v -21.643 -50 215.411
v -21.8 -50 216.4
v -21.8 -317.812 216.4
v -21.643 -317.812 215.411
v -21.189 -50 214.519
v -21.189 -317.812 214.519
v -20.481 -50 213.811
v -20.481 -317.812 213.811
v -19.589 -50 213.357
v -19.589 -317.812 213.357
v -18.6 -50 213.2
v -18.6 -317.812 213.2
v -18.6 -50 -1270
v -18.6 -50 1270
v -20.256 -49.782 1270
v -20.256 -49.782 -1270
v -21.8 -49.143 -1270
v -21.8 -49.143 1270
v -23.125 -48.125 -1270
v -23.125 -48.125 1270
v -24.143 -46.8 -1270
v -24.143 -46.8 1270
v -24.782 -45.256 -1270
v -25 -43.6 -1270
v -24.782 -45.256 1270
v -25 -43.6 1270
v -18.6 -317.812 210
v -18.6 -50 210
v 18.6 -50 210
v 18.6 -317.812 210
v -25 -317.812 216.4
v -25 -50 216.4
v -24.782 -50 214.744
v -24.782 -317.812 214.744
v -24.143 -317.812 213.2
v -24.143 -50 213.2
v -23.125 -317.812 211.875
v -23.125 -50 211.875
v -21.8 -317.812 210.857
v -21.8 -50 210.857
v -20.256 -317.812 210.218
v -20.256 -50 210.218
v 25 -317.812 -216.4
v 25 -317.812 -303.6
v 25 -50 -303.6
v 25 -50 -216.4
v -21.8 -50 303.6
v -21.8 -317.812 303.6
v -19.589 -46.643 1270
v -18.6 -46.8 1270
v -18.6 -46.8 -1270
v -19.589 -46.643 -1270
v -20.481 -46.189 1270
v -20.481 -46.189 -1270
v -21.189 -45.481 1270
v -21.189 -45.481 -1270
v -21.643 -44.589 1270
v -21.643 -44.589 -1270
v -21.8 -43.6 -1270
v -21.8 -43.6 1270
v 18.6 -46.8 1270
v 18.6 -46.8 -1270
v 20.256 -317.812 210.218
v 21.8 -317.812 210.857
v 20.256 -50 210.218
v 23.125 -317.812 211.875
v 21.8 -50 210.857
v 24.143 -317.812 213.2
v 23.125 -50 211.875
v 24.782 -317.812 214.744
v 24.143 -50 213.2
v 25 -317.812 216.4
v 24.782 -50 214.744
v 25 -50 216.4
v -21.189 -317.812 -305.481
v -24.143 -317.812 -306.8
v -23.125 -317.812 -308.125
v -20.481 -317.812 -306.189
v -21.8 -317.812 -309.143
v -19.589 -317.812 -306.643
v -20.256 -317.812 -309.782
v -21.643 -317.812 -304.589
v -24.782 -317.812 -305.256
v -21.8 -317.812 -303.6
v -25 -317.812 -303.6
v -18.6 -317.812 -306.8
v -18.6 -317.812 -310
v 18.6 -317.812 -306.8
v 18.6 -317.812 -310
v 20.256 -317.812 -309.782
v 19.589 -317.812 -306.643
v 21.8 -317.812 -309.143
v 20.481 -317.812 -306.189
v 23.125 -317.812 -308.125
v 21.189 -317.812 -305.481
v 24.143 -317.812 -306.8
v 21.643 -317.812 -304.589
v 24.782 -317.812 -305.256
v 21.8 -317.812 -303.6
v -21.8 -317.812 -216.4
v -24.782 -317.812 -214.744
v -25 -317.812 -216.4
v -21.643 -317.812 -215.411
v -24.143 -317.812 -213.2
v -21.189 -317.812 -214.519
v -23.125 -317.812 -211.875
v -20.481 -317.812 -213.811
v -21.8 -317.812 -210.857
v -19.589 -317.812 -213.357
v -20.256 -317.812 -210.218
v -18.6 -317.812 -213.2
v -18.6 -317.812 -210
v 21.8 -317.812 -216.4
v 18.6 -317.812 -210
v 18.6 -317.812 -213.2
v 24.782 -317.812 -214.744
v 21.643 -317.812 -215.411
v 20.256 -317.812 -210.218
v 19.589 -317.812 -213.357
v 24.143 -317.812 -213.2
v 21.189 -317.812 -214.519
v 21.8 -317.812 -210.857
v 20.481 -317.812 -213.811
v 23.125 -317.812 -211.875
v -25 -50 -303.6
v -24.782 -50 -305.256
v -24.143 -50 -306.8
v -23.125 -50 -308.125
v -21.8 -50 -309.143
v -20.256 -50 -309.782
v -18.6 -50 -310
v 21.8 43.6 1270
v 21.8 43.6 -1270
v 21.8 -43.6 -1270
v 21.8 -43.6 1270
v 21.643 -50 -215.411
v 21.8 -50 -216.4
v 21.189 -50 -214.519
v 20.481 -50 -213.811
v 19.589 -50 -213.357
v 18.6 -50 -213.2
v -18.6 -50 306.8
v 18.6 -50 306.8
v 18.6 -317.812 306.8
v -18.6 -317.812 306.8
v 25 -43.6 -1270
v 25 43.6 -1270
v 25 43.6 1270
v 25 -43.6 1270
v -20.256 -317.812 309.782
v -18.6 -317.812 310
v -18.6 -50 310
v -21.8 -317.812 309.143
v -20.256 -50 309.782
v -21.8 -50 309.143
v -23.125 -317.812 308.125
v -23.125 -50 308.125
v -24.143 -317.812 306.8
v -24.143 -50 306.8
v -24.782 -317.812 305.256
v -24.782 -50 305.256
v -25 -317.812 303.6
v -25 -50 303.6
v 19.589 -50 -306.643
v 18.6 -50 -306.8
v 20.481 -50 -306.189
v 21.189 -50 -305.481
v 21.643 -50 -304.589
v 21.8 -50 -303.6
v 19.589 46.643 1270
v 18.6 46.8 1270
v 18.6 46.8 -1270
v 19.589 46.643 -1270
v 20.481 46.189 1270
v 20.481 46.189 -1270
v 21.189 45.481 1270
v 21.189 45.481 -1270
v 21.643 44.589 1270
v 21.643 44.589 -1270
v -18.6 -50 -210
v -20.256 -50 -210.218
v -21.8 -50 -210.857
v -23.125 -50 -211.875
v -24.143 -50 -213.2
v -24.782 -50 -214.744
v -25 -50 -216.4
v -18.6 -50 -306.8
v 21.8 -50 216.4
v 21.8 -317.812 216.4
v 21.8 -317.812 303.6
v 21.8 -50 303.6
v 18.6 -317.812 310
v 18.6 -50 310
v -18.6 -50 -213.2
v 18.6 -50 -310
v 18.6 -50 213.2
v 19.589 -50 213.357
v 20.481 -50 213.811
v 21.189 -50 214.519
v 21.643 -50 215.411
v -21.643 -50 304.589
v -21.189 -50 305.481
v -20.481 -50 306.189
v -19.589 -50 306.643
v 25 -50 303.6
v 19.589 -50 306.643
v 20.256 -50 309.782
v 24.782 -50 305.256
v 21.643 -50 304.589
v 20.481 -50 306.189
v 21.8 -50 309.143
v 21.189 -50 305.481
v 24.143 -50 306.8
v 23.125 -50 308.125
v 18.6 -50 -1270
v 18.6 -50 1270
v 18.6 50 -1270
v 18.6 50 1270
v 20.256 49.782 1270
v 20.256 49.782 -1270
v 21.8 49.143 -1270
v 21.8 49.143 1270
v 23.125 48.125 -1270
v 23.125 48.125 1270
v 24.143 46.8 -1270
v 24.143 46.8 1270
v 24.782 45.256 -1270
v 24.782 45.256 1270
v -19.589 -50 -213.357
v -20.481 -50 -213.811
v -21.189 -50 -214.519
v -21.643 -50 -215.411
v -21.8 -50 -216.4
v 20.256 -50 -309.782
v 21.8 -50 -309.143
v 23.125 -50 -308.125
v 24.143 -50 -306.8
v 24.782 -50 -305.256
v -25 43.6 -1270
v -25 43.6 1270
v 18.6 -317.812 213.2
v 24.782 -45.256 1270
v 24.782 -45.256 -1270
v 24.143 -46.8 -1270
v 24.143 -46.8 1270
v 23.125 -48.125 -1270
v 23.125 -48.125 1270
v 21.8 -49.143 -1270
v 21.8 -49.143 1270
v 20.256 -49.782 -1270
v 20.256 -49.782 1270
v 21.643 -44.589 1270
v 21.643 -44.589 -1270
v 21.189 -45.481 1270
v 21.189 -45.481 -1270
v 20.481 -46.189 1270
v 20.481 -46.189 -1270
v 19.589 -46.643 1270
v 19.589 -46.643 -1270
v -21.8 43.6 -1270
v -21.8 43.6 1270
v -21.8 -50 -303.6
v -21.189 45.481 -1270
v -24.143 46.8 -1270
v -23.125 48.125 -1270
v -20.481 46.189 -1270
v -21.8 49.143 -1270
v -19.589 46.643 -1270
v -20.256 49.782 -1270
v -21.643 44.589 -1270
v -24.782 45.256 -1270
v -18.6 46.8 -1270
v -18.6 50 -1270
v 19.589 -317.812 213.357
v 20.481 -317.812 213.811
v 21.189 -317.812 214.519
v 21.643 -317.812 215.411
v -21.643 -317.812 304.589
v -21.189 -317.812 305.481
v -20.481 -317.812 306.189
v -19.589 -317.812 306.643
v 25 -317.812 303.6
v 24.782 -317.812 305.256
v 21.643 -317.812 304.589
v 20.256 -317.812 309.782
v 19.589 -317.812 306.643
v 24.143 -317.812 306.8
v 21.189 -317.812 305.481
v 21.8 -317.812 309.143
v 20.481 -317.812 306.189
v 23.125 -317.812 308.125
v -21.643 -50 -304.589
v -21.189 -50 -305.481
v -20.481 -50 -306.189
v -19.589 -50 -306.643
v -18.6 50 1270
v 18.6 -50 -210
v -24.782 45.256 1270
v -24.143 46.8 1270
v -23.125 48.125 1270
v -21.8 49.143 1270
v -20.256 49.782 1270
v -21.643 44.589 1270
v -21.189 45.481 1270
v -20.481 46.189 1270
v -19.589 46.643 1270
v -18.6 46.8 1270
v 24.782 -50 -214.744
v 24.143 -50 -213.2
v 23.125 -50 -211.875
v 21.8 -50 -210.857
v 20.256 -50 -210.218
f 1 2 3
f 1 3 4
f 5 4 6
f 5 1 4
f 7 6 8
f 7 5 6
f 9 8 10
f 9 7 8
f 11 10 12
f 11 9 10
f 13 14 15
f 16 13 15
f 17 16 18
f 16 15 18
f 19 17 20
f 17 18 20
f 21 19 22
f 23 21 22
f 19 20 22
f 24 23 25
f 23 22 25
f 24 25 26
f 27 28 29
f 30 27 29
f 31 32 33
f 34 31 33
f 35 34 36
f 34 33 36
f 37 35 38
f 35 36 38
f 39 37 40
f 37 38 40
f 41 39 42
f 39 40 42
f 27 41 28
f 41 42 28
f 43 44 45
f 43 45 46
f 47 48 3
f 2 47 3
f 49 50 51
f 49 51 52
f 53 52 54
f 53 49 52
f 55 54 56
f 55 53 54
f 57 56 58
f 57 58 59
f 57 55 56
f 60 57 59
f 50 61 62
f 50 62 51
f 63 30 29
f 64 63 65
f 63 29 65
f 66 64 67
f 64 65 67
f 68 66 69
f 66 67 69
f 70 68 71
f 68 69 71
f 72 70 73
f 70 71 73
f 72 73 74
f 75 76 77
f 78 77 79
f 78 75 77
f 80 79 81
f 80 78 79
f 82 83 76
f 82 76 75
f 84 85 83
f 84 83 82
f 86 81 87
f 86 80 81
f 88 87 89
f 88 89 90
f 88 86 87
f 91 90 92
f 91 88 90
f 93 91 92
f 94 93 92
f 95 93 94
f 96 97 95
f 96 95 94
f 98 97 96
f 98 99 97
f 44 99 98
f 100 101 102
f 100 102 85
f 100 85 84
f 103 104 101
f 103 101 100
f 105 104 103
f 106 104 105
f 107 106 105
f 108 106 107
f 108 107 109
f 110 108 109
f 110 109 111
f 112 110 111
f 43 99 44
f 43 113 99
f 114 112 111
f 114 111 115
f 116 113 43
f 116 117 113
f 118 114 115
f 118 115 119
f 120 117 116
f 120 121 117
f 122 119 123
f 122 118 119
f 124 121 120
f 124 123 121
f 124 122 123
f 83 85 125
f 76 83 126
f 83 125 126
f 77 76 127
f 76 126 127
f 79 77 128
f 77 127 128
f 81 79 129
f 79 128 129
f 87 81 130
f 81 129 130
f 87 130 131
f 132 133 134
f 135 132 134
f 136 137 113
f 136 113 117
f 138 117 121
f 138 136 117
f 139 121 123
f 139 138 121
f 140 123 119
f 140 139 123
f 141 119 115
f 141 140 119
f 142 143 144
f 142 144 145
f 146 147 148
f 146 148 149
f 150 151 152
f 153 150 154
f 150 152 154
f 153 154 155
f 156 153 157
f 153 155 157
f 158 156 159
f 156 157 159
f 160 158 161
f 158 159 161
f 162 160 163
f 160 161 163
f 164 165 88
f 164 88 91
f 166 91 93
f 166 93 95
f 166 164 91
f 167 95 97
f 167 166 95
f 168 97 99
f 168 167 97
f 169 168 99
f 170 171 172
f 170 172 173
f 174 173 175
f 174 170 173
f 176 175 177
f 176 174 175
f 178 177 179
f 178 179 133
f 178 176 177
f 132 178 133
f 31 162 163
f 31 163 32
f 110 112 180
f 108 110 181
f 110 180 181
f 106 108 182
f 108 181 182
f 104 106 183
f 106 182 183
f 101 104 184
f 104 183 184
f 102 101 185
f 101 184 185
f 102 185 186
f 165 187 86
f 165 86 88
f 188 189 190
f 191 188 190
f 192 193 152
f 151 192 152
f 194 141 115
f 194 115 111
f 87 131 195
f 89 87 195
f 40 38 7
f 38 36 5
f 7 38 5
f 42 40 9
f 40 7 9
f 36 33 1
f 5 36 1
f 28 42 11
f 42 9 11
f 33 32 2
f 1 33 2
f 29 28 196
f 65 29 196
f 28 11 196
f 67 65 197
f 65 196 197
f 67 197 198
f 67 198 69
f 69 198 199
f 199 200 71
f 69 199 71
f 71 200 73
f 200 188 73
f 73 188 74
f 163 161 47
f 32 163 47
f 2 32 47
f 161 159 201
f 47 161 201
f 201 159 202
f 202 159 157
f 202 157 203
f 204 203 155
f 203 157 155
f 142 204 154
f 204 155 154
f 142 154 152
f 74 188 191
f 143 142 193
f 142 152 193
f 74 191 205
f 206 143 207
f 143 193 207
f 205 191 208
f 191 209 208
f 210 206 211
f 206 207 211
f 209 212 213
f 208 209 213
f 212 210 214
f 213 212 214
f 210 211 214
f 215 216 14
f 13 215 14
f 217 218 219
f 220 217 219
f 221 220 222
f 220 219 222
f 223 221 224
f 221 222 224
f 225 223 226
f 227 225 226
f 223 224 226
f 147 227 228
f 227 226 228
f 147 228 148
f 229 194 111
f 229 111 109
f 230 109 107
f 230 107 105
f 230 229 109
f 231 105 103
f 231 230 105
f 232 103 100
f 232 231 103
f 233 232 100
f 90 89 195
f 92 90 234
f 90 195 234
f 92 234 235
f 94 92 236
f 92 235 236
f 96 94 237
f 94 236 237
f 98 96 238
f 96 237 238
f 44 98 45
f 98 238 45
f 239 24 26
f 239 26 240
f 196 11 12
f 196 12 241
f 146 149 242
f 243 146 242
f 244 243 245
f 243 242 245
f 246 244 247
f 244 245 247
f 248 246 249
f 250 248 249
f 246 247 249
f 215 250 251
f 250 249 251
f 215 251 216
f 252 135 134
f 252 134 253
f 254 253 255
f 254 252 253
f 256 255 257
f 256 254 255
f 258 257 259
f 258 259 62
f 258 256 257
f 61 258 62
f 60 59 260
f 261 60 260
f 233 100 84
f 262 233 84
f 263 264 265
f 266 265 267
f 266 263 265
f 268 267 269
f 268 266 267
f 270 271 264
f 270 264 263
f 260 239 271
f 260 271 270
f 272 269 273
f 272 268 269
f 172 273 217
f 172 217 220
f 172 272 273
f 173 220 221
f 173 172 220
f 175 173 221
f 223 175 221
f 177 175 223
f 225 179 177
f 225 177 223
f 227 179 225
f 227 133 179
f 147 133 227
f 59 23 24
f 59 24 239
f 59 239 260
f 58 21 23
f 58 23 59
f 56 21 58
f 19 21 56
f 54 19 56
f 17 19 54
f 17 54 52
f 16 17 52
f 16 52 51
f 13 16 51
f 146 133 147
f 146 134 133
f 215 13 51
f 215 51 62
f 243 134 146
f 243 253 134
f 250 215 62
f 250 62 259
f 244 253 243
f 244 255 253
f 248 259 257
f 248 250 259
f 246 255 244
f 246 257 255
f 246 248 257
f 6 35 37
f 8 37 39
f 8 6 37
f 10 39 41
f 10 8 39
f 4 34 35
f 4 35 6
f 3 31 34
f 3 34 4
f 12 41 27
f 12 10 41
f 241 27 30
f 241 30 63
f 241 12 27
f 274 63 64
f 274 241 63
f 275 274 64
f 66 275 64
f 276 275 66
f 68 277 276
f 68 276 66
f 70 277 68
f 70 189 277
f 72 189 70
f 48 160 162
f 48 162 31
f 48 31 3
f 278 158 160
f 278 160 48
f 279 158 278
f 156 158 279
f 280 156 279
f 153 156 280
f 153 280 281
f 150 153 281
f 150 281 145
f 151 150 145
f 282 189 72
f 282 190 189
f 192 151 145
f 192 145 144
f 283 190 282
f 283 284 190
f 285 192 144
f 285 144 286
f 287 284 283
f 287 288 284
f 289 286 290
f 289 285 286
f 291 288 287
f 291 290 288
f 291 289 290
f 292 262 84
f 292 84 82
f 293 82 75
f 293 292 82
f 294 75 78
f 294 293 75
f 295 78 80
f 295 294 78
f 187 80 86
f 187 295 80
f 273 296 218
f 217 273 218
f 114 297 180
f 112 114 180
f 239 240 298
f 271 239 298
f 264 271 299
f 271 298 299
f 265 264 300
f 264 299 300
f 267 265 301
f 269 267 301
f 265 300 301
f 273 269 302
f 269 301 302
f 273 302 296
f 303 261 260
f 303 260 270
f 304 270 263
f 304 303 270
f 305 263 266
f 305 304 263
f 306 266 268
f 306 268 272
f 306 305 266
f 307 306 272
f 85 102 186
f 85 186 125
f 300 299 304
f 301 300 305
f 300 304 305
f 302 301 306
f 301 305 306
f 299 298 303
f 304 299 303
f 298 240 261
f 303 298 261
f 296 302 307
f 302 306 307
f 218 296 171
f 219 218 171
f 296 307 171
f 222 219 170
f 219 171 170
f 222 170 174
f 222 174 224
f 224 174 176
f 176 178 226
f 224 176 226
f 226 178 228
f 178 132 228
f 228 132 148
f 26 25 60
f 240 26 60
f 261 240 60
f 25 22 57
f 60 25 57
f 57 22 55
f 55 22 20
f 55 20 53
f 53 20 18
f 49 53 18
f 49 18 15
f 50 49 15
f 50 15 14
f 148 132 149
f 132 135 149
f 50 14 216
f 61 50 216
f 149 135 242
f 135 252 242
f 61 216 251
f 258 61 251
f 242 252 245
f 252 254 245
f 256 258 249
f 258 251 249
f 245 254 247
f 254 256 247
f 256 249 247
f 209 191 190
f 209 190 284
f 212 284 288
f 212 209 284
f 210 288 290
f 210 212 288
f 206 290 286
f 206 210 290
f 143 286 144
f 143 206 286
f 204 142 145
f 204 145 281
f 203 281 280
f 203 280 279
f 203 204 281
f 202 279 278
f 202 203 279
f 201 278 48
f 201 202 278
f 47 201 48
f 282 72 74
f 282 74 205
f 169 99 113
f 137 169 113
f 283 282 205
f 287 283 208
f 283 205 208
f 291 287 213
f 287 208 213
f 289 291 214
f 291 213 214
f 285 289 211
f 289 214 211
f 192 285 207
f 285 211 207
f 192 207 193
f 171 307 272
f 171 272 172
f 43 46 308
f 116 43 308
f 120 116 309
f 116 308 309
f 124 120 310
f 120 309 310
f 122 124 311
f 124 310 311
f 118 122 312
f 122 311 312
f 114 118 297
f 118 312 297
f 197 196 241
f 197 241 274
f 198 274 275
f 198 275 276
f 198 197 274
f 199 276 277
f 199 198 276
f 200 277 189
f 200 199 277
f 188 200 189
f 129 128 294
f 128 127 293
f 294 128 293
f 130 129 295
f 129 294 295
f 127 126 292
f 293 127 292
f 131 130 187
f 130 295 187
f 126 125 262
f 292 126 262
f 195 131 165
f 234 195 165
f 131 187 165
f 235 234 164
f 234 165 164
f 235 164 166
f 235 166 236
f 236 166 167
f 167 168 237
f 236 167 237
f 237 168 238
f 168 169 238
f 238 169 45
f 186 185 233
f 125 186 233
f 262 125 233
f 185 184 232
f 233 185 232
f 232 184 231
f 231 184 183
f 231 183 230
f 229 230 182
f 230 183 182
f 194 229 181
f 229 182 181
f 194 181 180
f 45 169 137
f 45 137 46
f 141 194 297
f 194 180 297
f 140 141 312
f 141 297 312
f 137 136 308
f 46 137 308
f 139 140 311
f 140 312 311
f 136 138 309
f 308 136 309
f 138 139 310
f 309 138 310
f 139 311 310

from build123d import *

# Parameters (mm, degrees)
STRUCTURAL_MEMBER1_DEPTH   = 2540
STRUCTURAL_MEMBER1_2_DEPTH = 318.811628174
STRUCTURAL_MEMBER1_3_DEPTH = 318.811628174


with BuildPart() as part:
    # Sketch11 → Structural Member1 (new body)
    with BuildSketch(Plane(origin=(0, 0, 1270), x_dir=(1, 0, 0), z_dir=(0, 0, -1))):
        with BuildLine():
            Line((-18.6, -50), (18.6, -50))
            ThreePointArc((18.6, -50), (23.1254834, -48.1254834), (25, -43.6))
            Line((25, -43.6), (25, 43.6))
            ThreePointArc((25, 43.6), (23.1254834, 48.1254834), (18.6, 50))
            Line((18.6, 50), (-18.6, 50))
            ThreePointArc((-18.6, 50), (-23.1254834, 48.1254834), (-25, 43.6))
            Line((-25, 43.6), (-25, -43.6))
            ThreePointArc((-25, -43.6), (-23.1254834, -48.1254834), (-18.6, -50))
        make_face()
        with BuildLine():
            Line((-18.6, -46.8), (18.6, -46.8))
            ThreePointArc((18.6, -46.8), (20.8627417, -45.8627417), (21.8, -43.6))
            Line((21.8, -43.6), (21.8, 43.6))
            ThreePointArc((21.8, 43.6), (20.8627417, 45.8627417), (18.6, 46.8))
            Line((18.6, 46.8), (-18.6, 46.8))
            ThreePointArc((-18.6, 46.8), (-20.8627417, 45.8627417), (-21.8, 43.6))
            Line((-21.8, 43.6), (-21.8, -43.6))
            ThreePointArc((-21.8, -43.6), (-20.8627417, -45.8627417), (-18.6, -46.8))
        make_face(mode=Mode.SUBTRACT)
    extrude(amount=STRUCTURAL_MEMBER1_DEPTH)


with BuildPart() as body_2:
    # Sketch11 on segment 2 (carried to segment 2) → Structural Member1 2 (new body)
    with BuildSketch(Plane(origin=(0, 1, 260), x_dir=(1, 0, 0), z_dir=(0, -1, 0))):
        with BuildLine():
            Line((-18.6, -50), (18.6, -50))
            ThreePointArc((18.6, -50), (23.1254834, -48.1254834), (25, -43.6))
            Line((25, -43.6), (25, 43.6))
            ThreePointArc((25, 43.6), (23.1254834, 48.1254834), (18.6, 50))
            Line((18.6, 50), (-18.6, 50))
            ThreePointArc((-18.6, 50), (-23.1254834, 48.1254834), (-25, 43.6))
            Line((-25, 43.6), (-25, -43.6))
            ThreePointArc((-25, -43.6), (-23.1254834, -48.1254834), (-18.6, -50))
        make_face()
        with BuildLine():
            Line((-18.6, -46.8), (18.6, -46.8))
            ThreePointArc((18.6, -46.8), (20.8627417, -45.8627417), (21.8, -43.6))
            Line((21.8, -43.6), (21.8, 43.6))
            ThreePointArc((21.8, 43.6), (20.8627417, 45.8627417), (18.6, 46.8))
            Line((18.6, 46.8), (-18.6, 46.8))
            ThreePointArc((-18.6, 46.8), (-20.8627417, 45.8627417), (-21.8, 43.6))
            Line((-21.8, 43.6), (-21.8, -43.6))
            ThreePointArc((-21.8, -43.6), (-20.8627417, -45.8627417), (-18.6, -46.8))
        make_face(mode=Mode.SUBTRACT)
    extrude(amount=STRUCTURAL_MEMBER1_2_DEPTH)

    # Structural Member1 2 end butt 1
    split(bisect_by=Plane(origin=(0, -50, 260), x_dir=(1, 0, 0), z_dir=(0, -1, 0)), keep=Keep.TOP)


with BuildPart() as body_3:
    # Sketch11 on segment 3 (carried to segment 3) → Structural Member1 3 (new body)
    with BuildSketch(Plane(origin=(0, 1, -260), x_dir=(1, 0, 0), z_dir=(0, -1, 0))):
        with BuildLine():
            Line((-18.6, -50), (18.6, -50))
            ThreePointArc((18.6, -50), (23.1254834, -48.1254834), (25, -43.6))
            Line((25, -43.6), (25, 43.6))
            ThreePointArc((25, 43.6), (23.1254834, 48.1254834), (18.6, 50))
            Line((18.6, 50), (-18.6, 50))
            ThreePointArc((-18.6, 50), (-23.1254834, 48.1254834), (-25, 43.6))
            Line((-25, 43.6), (-25, -43.6))
            ThreePointArc((-25, -43.6), (-23.1254834, -48.1254834), (-18.6, -50))
        make_face()
        with BuildLine():
            Line((-18.6, -46.8), (18.6, -46.8))
            ThreePointArc((18.6, -46.8), (20.8627417, -45.8627417), (21.8, -43.6))
            Line((21.8, -43.6), (21.8, 43.6))
            ThreePointArc((21.8, 43.6), (20.8627417, 45.8627417), (18.6, 46.8))
            Line((18.6, 46.8), (-18.6, 46.8))
            ThreePointArc((-18.6, 46.8), (-20.8627417, 45.8627417), (-21.8, 43.6))
            Line((-21.8, 43.6), (-21.8, -43.6))
            ThreePointArc((-21.8, -43.6), (-20.8627417, -45.8627417), (-18.6, -46.8))
        make_face(mode=Mode.SUBTRACT)
    extrude(amount=STRUCTURAL_MEMBER1_3_DEPTH)

    # Structural Member1 3 end butt 1
    split(bisect_by=Plane(origin=(0, -50, -260), x_dir=(1, 0, 0), z_dir=(0, -1, 0)), keep=Keep.TOP)


solid = Compound([part.part, body_2.part, body_3.part])
